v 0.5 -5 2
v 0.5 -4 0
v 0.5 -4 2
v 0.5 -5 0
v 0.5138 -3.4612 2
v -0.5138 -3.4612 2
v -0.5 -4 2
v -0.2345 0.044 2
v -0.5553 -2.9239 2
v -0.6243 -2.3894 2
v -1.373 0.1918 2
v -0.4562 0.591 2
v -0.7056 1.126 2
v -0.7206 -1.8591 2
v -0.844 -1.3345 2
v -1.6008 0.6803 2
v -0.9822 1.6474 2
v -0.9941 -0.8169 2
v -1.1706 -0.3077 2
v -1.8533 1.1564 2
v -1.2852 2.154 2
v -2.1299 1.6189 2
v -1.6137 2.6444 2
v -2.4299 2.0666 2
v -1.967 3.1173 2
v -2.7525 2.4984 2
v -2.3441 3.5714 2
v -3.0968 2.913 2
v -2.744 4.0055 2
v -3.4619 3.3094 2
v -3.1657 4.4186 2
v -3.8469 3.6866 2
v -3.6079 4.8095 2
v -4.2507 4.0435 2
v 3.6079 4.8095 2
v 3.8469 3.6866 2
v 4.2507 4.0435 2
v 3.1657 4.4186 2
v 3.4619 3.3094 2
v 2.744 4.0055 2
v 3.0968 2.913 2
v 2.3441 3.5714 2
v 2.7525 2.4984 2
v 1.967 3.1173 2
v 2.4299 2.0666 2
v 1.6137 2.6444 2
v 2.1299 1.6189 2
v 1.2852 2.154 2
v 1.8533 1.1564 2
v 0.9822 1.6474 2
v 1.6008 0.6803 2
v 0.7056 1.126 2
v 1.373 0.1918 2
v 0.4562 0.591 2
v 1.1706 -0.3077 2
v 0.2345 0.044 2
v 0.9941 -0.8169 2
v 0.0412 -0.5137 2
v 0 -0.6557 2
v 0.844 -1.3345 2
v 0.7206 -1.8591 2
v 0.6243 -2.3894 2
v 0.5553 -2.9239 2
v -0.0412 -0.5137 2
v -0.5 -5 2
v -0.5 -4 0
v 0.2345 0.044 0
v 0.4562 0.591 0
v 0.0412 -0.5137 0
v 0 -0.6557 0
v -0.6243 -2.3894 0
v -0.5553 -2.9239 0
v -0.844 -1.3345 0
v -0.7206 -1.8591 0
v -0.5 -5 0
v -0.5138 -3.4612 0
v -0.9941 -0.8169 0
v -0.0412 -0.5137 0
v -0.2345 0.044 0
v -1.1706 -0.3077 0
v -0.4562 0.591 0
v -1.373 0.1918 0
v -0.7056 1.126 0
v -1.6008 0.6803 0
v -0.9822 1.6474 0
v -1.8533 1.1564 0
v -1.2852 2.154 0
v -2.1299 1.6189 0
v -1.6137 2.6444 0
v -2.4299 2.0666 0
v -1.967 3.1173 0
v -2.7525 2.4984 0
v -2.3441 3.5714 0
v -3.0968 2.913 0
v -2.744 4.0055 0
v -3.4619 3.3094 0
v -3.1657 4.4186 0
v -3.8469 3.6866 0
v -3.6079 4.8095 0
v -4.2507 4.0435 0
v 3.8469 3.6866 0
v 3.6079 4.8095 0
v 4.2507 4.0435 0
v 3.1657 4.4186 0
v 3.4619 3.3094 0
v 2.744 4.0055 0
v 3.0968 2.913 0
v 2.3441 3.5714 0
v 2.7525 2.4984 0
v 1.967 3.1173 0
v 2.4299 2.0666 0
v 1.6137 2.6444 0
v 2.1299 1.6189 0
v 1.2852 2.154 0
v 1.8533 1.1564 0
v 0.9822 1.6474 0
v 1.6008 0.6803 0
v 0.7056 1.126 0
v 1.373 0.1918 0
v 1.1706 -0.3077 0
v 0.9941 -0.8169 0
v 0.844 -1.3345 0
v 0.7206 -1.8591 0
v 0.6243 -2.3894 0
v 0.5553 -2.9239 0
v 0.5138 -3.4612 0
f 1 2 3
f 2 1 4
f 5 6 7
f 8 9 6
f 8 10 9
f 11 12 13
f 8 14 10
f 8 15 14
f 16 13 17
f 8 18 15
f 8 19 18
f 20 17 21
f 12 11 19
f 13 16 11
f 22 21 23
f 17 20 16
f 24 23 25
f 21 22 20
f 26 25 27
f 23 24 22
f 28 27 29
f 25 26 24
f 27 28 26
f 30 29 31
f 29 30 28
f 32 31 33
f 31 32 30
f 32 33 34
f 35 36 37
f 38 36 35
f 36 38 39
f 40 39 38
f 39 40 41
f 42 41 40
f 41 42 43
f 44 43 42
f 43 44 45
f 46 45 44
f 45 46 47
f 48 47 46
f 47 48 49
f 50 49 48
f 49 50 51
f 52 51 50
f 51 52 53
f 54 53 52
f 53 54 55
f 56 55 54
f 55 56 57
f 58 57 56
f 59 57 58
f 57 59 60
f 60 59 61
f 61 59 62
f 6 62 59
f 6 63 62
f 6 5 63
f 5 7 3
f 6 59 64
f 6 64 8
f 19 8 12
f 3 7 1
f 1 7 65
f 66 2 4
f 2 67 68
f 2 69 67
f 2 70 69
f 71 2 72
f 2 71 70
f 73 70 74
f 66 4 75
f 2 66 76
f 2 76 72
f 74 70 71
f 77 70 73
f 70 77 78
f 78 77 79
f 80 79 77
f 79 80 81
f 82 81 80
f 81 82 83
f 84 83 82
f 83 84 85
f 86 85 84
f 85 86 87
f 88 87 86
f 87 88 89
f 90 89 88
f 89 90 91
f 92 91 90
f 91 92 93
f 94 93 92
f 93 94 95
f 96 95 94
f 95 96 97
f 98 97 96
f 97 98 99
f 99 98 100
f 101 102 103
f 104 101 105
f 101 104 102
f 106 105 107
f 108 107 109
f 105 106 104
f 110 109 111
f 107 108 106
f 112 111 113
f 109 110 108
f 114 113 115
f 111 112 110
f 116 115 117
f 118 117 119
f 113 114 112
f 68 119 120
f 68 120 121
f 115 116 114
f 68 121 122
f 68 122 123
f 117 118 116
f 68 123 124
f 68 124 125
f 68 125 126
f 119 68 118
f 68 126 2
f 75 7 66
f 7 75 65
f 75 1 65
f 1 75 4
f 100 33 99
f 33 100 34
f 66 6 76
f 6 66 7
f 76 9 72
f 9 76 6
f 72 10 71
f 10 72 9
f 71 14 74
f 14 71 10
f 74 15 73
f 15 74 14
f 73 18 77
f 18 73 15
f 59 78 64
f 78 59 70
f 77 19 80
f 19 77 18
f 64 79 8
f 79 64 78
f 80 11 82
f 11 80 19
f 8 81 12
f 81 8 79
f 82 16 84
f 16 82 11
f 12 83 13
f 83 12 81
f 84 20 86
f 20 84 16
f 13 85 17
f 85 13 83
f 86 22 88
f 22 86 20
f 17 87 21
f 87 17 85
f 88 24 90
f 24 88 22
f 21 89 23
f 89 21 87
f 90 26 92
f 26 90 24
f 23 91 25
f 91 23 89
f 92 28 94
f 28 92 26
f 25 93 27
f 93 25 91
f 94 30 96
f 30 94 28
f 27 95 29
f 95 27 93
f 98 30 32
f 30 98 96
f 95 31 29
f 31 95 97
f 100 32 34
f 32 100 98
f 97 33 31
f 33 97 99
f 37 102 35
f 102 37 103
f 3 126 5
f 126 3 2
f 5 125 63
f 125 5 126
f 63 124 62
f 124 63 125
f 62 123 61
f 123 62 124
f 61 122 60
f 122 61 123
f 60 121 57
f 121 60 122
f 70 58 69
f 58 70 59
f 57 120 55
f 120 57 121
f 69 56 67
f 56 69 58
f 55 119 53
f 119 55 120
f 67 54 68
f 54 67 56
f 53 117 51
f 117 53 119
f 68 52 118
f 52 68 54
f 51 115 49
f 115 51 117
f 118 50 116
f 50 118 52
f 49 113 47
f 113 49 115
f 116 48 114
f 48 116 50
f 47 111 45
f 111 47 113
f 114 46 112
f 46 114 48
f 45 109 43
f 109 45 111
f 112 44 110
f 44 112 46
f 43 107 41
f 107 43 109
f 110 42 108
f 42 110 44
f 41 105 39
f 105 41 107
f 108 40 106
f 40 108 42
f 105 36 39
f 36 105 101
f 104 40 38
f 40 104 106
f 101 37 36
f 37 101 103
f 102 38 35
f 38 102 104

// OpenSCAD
// file: ../config/colors.scad
/* RailEduKit/InteractiveSignallingLaboratory © 2025 by Martin Scheidt and contributors
 * License: CC-BY 4.0 - https://creativecommons.org/licenses/by/4.0/
 * Project description: The Interactive Signalling Laboratory is a tool for training in Rail
 * Applications to enhance the knowledge of control and signalling principles for rail transport systems.
 *
 * Module: config/colors.scad
 */


SPRUCE_WOOD = [231/255, 203/255, 172/255]; // Desert Sand by https://www.schemecolor.com/spruce-wood-colors.php

// component colors
BASE_COLOR = [0.25, 0.25, 0.25];// lighter black to see the shapes
INDICATOR_COLOR = "white";
ROUTE_COLOR = [0.255, 0.412, 0.882]; //[0.396, 0.467, 0.702];

METALLIC_GREY = [0.474, 0.482, 0.482];



// signal colors
ASPECT_CLEAR = "green";
ASPECT_APPROACH = "yellow";
ASPECT_STOP = "red";
// main file
/* RailEduKit/InteractiveSignallingLaboratory © 2025 by Martin Scheidt and contributors
 * License: CC-BY 4.0 - https://creativecommons.org/licenses/by/4.0/
 * Project description: The Interactive Signalling Laboratory is a tool for training in Rail
 * Applications to enhance the knowledge of control and signalling principles for rail transport systems.
 *
 * Module: checkbox_symbols_route
 */

// Include configuration file
include <../config/global_variables.scad>
include <../config/colors.scad>

//road Checkbox -> rc
rc_symbol_side_space = 2;
rc_symbol_size = body_width*(2/3)-locker_width/2-2*rc_symbol_side_space;
straight_thickness = 0.8;
rc_arrow_depth = 4;
rc_arrowline_length = 4;
junction_r=11.5;

module bidirectional_arrow() {
	translate([ -rc_arrowline_length / 2, -1.2 / 2, 0 ])
	cube([ rc_arrowline_length, 1.2, engraving_height ]);
	translate([ rc_arrow_depth * (3 / 8) + rc_arrowline_length / 2, 0, 0 ])
	scale([ 3 / 4, (rc_arrow_depth / (2 * rc_arrow_depth * sin(120))), 1 ])
	    cylinder(engraving_height, rc_arrow_depth, rc_arrow_depth, $fn = 3);
	rotate([ 0, 0, 180 ])
	translate([ rc_arrow_depth * (3 / 8) + rc_arrowline_length / 2, 0, 0 ])
	scale([ 3 / 4, (rc_arrow_depth / (2 * rc_arrow_depth * sin(120))), 1 ])
	    cylinder(engraving_height, rc_arrow_depth, rc_arrow_depth, $fn = 3);
}

module overlap_symbol() { // this has to be adopted to the new overlap pattern (to be seen in overlap_straigth)
	module overlap() {
		difference() {
			union() {
				translate([ -rc_symbol_size / 2, -rc_symbol_size * (4 / 6), 0 ])
				difference() {
					cube([ rc_symbol_size, rc_symbol_size * (4 / 3), engraving_height ]);
					for (i = [1:4:rc_symbol_size * (5 / 3)]) {
						translate([ straight_thickness, i * straight_thickness, 0 ])
						cube([ rc_symbol_size - straight_thickness, straight_thickness, engraving_height ]);
						echo(i);
					}
					for (i = [3:4:rc_symbol_size * (5 / 3)]) {
						translate([ 0, i * straight_thickness, 0 ])
						cube([ rc_symbol_size - straight_thickness, straight_thickness, engraving_height ]);
					}
				}
			}
			translate([ -5.5, -1, engraving_height / 2 ])
			rotate([ 0, 0, 53.13 ])
			cube([ 25, 10, engraving_height ], center = true);
		}
	}
	module slash() {
		translate([ -0.1, -0.1, engraving_height / 2 ])
		rotate([ 0, 0, 53.13 ])
		cube([ 15.5, 1, engraving_height ], center = true);
	}

	module arrow() {
		difference() {
			translate([ -1, 1.8, 0 ])
			rotate([ 0, 0, 53.13 ])
			bidirectional_arrow();
			translate([ 3.7, -1.7, engraving_height / 2 ])
			rotate([ 0, 0, 53.13 ])
			cube([ 15, 10, engraving_height ], center = true);
		}
	}
	overlap();
	slash();
	translate([ -0.3, 0, 0 ])
	arrow();
}

module turnout_locking_symbol() {
	module schematic_drawing() {
		translate([ -rc_symbol_size / 2, -2, 0 ])
		linear_extrude(height = engraving_height) union() {
			polygon(points = [ [ 0, 0 ], [ rc_symbol_size / 2, 0 ], [ rc_symbol_size / 2, rc_symbol_size / 2 ] ]);
			translate([ 1, 0 ])
			square([ rc_symbol_size - 1, straight_thickness ]);
			translate([ 1.15, 0 ])
			rotate([ 0, 0, 45 ])
			square([ rc_symbol_size, straight_thickness ]);
		}
	}
	module junction_curve() {
		rotate_extrude(angle = 50) difference() {
			square([ junction_r, engraving_height ]);
			square([ junction_r - regular_line, engraving_height ]);
		}
	}
	module junction() {
		translate([ -regular_line / 2, 0, 0 ])
		cube([ regular_line, 1, engraving_height ]);
		translate([ -(junction_r - regular_line / 2), 1, 0 ])
		junction_curve();
		translate([ junction_r - regular_line / 2, 1, engraving_height ])
		rotate([ 0, 180, 0 ])
		junction_curve();
	}
	translate([ 0, -5, 0 ])
	junction();
}

module flank_protection_symbol() {
	module buckler_half() {
		translate([ rc_symbol_size * (2 / 3), 0, 0 ])
		difference() {
			cylinder(d = 3 * rc_symbol_size, h = engraving_height);
			translate([ -rc_symbol_size * (3 / 2), 0, 0 ])
			cube([ 6 * rc_symbol_size, 6 * rc_symbol_size, engraving_height ]);
			translate([ -rc_symbol_size * (2 / 3), -rc_symbol_size * (3 / 2), 0 ])
			cube([ 6 * rc_symbol_size, 6 * rc_symbol_size, engraving_height ]);
		}
	}
	module buckler() {
		translate([ 0, 6, 0 ])
		difference() {
			scale([ 5 / 8, 1, 1 ]) union() {
				buckler_half();
				mirror([ 1, 0, 0 ]) buckler_half();
			}
			scale([ 1, 0.5, 1 ]) translate([ 0, rc_symbol_size * (6 / 7), 0 ])
			cylinder(d = 2 * rc_symbol_size, h = engraving_height);
			translate([ 0, -14, 2 ])
			rotate([ 0, 15, 0 ])
			cube([ rc_symbol_size, 14, 3 ]);
			translate([ 0, 0, 2 ])
			rotate([ 0, 15, 180 ])
			cube([ rc_symbol_size, 14, 3 ]);
		}
	}
	buckler();
}


color(BASE_COLOR) turnout_locking_symbol();
